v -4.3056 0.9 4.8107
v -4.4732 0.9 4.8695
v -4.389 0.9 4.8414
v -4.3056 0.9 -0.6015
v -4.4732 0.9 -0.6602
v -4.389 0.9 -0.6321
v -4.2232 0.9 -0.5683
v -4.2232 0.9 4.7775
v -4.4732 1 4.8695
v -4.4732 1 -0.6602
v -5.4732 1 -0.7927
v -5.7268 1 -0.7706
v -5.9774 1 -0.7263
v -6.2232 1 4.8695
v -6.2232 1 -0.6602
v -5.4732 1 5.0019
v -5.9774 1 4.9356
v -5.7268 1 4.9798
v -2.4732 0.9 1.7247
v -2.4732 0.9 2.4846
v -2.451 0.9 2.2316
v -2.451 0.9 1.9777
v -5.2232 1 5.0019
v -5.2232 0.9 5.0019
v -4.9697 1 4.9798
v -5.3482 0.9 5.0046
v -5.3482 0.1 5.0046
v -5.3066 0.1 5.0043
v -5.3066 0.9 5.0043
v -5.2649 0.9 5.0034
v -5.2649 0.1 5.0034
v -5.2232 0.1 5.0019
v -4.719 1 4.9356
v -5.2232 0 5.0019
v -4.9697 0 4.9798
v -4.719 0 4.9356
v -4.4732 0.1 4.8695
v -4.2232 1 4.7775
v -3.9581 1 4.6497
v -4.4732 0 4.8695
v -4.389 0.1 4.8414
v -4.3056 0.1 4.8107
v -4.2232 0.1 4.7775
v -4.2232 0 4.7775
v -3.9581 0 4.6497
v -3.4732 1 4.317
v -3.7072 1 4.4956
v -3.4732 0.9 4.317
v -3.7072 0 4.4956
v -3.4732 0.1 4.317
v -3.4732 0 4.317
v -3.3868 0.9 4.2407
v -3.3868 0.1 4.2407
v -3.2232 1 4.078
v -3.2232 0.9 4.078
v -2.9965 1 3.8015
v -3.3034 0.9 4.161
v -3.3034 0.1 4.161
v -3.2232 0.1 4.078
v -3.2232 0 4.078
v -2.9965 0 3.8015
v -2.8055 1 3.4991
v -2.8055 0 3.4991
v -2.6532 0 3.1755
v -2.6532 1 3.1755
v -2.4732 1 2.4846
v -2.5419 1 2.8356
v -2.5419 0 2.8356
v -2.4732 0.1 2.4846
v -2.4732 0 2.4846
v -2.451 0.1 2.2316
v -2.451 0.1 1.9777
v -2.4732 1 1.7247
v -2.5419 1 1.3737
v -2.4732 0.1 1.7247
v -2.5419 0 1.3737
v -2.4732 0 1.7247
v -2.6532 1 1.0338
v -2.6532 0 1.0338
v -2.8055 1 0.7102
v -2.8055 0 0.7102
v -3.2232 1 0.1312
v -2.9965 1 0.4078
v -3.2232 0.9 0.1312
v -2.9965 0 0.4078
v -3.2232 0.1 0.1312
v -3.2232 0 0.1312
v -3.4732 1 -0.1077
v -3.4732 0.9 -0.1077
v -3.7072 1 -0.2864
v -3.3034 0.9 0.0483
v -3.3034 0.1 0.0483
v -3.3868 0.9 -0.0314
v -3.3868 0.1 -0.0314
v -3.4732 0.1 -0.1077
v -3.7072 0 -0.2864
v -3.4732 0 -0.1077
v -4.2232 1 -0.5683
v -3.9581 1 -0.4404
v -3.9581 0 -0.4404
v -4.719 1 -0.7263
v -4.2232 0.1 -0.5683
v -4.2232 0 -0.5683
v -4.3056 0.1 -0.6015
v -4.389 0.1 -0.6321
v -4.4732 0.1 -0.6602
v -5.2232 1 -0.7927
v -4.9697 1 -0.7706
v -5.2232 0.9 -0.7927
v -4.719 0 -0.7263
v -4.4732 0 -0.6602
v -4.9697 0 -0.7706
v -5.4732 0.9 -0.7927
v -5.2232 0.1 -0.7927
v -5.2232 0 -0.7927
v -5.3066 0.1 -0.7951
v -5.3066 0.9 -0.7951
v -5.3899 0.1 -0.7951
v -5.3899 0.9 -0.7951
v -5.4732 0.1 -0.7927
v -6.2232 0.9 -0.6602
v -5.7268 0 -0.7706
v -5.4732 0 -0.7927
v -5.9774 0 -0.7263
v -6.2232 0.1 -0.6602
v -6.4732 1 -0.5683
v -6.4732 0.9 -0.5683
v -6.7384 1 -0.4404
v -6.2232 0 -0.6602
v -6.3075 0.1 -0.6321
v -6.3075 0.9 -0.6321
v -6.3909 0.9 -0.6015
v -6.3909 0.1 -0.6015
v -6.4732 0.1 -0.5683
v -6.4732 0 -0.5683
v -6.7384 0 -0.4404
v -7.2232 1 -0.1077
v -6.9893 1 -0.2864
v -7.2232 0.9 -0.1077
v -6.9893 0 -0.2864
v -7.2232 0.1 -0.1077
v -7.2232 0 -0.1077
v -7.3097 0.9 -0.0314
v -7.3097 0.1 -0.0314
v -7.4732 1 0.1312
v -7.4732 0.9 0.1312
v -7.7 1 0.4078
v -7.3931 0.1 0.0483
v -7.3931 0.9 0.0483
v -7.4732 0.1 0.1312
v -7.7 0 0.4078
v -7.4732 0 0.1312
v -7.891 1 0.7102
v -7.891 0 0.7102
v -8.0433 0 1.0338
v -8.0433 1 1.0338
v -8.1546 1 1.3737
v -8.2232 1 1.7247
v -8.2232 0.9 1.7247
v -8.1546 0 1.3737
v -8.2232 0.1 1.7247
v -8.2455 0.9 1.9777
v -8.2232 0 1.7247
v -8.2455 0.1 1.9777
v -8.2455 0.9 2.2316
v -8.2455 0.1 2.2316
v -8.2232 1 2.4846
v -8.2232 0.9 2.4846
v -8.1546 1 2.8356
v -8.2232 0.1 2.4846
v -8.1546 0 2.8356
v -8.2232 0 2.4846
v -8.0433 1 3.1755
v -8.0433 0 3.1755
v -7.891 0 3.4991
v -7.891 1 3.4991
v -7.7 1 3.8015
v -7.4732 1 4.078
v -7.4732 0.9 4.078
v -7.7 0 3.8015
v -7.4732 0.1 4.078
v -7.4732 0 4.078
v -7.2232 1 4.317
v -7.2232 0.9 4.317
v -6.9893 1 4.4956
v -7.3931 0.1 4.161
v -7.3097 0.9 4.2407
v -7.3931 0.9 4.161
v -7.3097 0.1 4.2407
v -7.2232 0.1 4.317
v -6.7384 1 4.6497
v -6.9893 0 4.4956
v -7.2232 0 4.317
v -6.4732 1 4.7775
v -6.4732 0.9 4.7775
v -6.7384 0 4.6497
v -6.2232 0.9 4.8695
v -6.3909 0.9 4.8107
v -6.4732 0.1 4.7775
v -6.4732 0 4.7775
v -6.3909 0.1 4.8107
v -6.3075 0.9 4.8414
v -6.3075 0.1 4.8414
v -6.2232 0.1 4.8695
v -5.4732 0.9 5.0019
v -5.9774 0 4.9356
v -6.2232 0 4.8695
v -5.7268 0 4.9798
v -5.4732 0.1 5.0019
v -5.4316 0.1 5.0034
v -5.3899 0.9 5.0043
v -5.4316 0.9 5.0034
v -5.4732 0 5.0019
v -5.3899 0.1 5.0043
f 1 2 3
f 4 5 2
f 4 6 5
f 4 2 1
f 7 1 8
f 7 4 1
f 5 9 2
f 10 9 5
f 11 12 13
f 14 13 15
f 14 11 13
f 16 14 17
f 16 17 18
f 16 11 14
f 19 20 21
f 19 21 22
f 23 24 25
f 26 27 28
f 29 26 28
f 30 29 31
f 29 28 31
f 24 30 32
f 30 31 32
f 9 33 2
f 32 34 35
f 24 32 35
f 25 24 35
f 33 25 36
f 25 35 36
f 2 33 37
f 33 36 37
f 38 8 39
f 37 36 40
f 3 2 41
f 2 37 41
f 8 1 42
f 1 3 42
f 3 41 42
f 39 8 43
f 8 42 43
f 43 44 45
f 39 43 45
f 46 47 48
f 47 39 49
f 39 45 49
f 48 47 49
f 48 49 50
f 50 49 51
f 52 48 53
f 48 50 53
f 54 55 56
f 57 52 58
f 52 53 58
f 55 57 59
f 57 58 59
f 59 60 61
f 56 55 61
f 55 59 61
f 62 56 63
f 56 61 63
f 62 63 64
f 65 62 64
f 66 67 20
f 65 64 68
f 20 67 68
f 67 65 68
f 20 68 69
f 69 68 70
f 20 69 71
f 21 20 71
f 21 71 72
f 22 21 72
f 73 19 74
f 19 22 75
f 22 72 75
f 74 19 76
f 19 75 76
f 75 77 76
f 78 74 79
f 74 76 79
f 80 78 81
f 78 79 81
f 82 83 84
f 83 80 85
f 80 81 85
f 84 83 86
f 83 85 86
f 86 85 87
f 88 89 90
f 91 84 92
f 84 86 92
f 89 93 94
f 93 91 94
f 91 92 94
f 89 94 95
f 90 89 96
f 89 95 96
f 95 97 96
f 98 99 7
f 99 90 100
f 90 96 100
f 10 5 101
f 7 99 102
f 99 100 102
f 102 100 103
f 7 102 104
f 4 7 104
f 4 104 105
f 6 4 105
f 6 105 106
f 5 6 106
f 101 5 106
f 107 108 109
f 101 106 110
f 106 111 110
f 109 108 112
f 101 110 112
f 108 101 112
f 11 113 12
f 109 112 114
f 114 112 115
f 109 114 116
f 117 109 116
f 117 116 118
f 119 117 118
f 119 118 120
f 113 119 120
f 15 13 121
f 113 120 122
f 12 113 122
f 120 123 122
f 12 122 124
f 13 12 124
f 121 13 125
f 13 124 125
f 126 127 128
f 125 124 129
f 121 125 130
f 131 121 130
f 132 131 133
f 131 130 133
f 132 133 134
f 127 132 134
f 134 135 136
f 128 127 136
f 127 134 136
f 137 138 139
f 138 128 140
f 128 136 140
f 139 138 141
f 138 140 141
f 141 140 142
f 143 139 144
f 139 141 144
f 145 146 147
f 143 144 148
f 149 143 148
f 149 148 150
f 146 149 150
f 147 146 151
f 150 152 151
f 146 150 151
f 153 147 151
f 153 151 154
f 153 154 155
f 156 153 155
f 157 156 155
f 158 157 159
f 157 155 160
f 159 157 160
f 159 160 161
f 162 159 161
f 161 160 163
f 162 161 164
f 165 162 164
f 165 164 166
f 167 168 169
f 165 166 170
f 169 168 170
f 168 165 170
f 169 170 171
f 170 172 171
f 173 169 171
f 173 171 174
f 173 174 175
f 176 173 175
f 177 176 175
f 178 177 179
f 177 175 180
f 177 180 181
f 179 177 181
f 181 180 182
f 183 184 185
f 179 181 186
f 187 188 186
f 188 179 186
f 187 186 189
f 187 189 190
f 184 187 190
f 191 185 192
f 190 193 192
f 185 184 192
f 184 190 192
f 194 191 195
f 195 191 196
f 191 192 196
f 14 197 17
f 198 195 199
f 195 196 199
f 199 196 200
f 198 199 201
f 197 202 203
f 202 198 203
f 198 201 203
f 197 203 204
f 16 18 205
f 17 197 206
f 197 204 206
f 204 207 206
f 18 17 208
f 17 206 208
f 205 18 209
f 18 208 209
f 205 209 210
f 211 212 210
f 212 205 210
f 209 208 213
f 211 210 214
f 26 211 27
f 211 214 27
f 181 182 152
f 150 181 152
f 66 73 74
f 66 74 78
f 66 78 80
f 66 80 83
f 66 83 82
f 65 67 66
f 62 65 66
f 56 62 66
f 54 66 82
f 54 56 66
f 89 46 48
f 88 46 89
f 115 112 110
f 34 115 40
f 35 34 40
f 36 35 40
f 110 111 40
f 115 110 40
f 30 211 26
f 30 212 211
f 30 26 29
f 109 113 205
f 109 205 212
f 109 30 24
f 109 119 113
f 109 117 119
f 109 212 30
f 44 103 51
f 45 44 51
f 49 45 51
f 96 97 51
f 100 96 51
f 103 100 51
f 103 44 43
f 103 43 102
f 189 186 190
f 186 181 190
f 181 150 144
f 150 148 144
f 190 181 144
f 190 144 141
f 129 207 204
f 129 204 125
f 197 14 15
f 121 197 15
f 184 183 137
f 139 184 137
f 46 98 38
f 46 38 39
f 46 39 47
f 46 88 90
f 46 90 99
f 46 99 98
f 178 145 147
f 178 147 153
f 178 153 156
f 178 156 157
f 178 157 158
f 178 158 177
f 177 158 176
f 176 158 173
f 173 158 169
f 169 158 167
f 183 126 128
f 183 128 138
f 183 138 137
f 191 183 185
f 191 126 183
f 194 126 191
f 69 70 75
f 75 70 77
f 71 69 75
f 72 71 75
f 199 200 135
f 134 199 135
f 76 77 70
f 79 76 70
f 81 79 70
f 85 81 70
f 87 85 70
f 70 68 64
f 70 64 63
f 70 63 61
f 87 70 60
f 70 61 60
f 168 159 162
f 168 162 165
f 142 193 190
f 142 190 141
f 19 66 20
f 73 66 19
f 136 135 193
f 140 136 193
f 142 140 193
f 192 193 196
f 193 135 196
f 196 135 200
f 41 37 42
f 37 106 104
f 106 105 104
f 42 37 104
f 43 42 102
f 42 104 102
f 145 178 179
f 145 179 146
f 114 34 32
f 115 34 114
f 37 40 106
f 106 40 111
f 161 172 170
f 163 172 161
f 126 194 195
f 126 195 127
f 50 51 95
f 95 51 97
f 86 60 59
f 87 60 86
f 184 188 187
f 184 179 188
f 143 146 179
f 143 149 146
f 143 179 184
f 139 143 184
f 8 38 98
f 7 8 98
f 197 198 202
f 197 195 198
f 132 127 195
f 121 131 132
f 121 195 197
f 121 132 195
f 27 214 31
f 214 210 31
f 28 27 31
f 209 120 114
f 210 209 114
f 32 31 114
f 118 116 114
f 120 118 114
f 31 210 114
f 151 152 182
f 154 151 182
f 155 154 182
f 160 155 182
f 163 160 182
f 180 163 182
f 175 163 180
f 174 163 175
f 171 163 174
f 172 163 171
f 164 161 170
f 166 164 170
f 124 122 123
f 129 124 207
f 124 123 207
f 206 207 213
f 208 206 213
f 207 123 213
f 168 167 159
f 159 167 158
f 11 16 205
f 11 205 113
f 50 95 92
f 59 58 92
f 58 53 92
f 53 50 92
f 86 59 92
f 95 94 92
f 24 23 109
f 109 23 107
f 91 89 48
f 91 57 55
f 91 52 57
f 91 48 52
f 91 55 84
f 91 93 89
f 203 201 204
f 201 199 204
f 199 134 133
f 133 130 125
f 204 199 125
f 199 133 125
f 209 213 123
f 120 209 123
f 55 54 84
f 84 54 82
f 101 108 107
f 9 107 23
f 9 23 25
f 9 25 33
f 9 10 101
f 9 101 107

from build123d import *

# Parameters (mm, degrees)
SKETCH1_R           = 2.9
BOSS_EXTRUDE1_DEPTH = 1
SKETCH2_W           = 0.25
SKETCH2_H           = 5.8
CUT_EXTRUDE1_DEPTH  = 0.1


with BuildPart() as part:
    # Sketch1 → Boss-Extrude1 (new body)
    with BuildSketch(Plane(origin=(0, 0, 0), x_dir=(1, 0, 0), z_dir=(0, 1, 0))):
        with Locations(Location((-5.348238854, -2.10463103, 0), (0, 0, 270))):
            Circle(SKETCH1_R)
    extrude(amount=BOSS_EXTRUDE1_DEPTH)

    # Sketch2 → Cut-Extrude1 (cut)
    with BuildSketch(Plane(origin=(0, 1, 0), x_dir=(1, 0, 0), z_dir=(0, 1, 0))):
        with Locations((-10.348238854, -2.10463103)):
            Rectangle(SKETCH2_W, SKETCH2_H)
        with Locations((-11.348238854, -2.10463103)):
            Rectangle(SKETCH2_W, SKETCH2_H)
        with Locations((-9.348238854, -2.10463103)):
            Rectangle(SKETCH2_W, SKETCH2_H)
        with Locations((-8.348238854, -2.10463103)):
            Rectangle(SKETCH2_W, SKETCH2_H)
        with Locations((-7.348238854, -2.10463103)):
            Rectangle(SKETCH2_W, SKETCH2_H)
        with Locations((-6.348238854, -2.10463103)):
            Rectangle(SKETCH2_W, SKETCH2_H)
        with Locations((-5.348238854, -2.10463103)):
            Rectangle(SKETCH2_W, SKETCH2_H)
        with Locations((-4.348238854, -2.10463103)):
            Rectangle(SKETCH2_W, SKETCH2_H)
        with Locations((-3.348238854, -2.10463103)):
            Rectangle(SKETCH2_W, SKETCH2_H)
        with Locations((-2.348238854, -2.10463103)):
            Rectangle(SKETCH2_W, SKETCH2_H)
        with Locations((-1.348238854, -2.10463103)):
            Rectangle(SKETCH2_W, SKETCH2_H)
        with Locations((-0.348238854, -2.10463103)):
            Rectangle(SKETCH2_W, SKETCH2_H)
        with Locations((0.651761146, -2.10463103)):
            Rectangle(SKETCH2_W, SKETCH2_H)
        with Locations((1.651761146, -2.10463103)):
            Rectangle(SKETCH2_W, SKETCH2_H)
        with Locations((2.651761146, -2.10463103)):
            Rectangle(SKETCH2_W, SKETCH2_H)
    cut_extrude1 = extrude(amount=-CUT_EXTRUDE1_DEPTH, mode=Mode.SUBTRACT)

    # Mirror1: Cut-Extrude1 across plane
    add(cut_extrude1.mirror(Plane(origin=(0, 0.5, 0), x_dir=(0, 0, 1), z_dir=(0, -1, 0))), mode=Mode.SUBTRACT)


solid = part.part
